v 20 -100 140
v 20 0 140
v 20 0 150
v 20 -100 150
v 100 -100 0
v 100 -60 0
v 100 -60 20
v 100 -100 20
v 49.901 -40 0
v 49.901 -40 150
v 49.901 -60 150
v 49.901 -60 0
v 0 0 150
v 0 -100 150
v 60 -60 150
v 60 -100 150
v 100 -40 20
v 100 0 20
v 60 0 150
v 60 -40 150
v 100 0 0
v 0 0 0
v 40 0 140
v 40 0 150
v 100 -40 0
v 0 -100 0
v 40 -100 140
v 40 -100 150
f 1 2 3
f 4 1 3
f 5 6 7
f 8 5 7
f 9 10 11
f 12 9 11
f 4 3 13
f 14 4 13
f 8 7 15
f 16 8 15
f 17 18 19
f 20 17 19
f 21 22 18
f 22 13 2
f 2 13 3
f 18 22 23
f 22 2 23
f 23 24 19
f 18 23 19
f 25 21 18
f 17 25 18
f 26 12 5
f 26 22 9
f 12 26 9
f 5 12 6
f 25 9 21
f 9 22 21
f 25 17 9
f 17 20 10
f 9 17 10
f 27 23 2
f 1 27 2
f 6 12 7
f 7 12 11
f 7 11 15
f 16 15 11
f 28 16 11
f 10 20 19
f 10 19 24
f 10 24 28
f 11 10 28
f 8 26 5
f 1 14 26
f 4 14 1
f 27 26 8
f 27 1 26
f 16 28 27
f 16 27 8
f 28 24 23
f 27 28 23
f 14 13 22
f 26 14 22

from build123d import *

# Parameters (mm, degrees)
F1_DEPTH = 100
F3_DEPTH = 182


with BuildPart() as f1:
    # F0 (on Front) → F1 (new body)
    with BuildSketch(Plane.XZ):
        Polygon((0, 150), (0, 0), (100, 0), (100, 20), (60, 150), (40, 150), (40, 140), (20, 140), (20, 150), align=None)
    extrude(amount=F1_DEPTH)

    # F2 (on face) → F3 (cut)
    with BuildSketch(Plane.XY.offset(150)):
        Polygon((140, -60), (140, -50), (140, -40), (49.901433, -40), (49.901433, -60), align=None)
    extrude(amount=-F3_DEPTH, mode=Mode.SUBTRACT)


solid = f1.part
